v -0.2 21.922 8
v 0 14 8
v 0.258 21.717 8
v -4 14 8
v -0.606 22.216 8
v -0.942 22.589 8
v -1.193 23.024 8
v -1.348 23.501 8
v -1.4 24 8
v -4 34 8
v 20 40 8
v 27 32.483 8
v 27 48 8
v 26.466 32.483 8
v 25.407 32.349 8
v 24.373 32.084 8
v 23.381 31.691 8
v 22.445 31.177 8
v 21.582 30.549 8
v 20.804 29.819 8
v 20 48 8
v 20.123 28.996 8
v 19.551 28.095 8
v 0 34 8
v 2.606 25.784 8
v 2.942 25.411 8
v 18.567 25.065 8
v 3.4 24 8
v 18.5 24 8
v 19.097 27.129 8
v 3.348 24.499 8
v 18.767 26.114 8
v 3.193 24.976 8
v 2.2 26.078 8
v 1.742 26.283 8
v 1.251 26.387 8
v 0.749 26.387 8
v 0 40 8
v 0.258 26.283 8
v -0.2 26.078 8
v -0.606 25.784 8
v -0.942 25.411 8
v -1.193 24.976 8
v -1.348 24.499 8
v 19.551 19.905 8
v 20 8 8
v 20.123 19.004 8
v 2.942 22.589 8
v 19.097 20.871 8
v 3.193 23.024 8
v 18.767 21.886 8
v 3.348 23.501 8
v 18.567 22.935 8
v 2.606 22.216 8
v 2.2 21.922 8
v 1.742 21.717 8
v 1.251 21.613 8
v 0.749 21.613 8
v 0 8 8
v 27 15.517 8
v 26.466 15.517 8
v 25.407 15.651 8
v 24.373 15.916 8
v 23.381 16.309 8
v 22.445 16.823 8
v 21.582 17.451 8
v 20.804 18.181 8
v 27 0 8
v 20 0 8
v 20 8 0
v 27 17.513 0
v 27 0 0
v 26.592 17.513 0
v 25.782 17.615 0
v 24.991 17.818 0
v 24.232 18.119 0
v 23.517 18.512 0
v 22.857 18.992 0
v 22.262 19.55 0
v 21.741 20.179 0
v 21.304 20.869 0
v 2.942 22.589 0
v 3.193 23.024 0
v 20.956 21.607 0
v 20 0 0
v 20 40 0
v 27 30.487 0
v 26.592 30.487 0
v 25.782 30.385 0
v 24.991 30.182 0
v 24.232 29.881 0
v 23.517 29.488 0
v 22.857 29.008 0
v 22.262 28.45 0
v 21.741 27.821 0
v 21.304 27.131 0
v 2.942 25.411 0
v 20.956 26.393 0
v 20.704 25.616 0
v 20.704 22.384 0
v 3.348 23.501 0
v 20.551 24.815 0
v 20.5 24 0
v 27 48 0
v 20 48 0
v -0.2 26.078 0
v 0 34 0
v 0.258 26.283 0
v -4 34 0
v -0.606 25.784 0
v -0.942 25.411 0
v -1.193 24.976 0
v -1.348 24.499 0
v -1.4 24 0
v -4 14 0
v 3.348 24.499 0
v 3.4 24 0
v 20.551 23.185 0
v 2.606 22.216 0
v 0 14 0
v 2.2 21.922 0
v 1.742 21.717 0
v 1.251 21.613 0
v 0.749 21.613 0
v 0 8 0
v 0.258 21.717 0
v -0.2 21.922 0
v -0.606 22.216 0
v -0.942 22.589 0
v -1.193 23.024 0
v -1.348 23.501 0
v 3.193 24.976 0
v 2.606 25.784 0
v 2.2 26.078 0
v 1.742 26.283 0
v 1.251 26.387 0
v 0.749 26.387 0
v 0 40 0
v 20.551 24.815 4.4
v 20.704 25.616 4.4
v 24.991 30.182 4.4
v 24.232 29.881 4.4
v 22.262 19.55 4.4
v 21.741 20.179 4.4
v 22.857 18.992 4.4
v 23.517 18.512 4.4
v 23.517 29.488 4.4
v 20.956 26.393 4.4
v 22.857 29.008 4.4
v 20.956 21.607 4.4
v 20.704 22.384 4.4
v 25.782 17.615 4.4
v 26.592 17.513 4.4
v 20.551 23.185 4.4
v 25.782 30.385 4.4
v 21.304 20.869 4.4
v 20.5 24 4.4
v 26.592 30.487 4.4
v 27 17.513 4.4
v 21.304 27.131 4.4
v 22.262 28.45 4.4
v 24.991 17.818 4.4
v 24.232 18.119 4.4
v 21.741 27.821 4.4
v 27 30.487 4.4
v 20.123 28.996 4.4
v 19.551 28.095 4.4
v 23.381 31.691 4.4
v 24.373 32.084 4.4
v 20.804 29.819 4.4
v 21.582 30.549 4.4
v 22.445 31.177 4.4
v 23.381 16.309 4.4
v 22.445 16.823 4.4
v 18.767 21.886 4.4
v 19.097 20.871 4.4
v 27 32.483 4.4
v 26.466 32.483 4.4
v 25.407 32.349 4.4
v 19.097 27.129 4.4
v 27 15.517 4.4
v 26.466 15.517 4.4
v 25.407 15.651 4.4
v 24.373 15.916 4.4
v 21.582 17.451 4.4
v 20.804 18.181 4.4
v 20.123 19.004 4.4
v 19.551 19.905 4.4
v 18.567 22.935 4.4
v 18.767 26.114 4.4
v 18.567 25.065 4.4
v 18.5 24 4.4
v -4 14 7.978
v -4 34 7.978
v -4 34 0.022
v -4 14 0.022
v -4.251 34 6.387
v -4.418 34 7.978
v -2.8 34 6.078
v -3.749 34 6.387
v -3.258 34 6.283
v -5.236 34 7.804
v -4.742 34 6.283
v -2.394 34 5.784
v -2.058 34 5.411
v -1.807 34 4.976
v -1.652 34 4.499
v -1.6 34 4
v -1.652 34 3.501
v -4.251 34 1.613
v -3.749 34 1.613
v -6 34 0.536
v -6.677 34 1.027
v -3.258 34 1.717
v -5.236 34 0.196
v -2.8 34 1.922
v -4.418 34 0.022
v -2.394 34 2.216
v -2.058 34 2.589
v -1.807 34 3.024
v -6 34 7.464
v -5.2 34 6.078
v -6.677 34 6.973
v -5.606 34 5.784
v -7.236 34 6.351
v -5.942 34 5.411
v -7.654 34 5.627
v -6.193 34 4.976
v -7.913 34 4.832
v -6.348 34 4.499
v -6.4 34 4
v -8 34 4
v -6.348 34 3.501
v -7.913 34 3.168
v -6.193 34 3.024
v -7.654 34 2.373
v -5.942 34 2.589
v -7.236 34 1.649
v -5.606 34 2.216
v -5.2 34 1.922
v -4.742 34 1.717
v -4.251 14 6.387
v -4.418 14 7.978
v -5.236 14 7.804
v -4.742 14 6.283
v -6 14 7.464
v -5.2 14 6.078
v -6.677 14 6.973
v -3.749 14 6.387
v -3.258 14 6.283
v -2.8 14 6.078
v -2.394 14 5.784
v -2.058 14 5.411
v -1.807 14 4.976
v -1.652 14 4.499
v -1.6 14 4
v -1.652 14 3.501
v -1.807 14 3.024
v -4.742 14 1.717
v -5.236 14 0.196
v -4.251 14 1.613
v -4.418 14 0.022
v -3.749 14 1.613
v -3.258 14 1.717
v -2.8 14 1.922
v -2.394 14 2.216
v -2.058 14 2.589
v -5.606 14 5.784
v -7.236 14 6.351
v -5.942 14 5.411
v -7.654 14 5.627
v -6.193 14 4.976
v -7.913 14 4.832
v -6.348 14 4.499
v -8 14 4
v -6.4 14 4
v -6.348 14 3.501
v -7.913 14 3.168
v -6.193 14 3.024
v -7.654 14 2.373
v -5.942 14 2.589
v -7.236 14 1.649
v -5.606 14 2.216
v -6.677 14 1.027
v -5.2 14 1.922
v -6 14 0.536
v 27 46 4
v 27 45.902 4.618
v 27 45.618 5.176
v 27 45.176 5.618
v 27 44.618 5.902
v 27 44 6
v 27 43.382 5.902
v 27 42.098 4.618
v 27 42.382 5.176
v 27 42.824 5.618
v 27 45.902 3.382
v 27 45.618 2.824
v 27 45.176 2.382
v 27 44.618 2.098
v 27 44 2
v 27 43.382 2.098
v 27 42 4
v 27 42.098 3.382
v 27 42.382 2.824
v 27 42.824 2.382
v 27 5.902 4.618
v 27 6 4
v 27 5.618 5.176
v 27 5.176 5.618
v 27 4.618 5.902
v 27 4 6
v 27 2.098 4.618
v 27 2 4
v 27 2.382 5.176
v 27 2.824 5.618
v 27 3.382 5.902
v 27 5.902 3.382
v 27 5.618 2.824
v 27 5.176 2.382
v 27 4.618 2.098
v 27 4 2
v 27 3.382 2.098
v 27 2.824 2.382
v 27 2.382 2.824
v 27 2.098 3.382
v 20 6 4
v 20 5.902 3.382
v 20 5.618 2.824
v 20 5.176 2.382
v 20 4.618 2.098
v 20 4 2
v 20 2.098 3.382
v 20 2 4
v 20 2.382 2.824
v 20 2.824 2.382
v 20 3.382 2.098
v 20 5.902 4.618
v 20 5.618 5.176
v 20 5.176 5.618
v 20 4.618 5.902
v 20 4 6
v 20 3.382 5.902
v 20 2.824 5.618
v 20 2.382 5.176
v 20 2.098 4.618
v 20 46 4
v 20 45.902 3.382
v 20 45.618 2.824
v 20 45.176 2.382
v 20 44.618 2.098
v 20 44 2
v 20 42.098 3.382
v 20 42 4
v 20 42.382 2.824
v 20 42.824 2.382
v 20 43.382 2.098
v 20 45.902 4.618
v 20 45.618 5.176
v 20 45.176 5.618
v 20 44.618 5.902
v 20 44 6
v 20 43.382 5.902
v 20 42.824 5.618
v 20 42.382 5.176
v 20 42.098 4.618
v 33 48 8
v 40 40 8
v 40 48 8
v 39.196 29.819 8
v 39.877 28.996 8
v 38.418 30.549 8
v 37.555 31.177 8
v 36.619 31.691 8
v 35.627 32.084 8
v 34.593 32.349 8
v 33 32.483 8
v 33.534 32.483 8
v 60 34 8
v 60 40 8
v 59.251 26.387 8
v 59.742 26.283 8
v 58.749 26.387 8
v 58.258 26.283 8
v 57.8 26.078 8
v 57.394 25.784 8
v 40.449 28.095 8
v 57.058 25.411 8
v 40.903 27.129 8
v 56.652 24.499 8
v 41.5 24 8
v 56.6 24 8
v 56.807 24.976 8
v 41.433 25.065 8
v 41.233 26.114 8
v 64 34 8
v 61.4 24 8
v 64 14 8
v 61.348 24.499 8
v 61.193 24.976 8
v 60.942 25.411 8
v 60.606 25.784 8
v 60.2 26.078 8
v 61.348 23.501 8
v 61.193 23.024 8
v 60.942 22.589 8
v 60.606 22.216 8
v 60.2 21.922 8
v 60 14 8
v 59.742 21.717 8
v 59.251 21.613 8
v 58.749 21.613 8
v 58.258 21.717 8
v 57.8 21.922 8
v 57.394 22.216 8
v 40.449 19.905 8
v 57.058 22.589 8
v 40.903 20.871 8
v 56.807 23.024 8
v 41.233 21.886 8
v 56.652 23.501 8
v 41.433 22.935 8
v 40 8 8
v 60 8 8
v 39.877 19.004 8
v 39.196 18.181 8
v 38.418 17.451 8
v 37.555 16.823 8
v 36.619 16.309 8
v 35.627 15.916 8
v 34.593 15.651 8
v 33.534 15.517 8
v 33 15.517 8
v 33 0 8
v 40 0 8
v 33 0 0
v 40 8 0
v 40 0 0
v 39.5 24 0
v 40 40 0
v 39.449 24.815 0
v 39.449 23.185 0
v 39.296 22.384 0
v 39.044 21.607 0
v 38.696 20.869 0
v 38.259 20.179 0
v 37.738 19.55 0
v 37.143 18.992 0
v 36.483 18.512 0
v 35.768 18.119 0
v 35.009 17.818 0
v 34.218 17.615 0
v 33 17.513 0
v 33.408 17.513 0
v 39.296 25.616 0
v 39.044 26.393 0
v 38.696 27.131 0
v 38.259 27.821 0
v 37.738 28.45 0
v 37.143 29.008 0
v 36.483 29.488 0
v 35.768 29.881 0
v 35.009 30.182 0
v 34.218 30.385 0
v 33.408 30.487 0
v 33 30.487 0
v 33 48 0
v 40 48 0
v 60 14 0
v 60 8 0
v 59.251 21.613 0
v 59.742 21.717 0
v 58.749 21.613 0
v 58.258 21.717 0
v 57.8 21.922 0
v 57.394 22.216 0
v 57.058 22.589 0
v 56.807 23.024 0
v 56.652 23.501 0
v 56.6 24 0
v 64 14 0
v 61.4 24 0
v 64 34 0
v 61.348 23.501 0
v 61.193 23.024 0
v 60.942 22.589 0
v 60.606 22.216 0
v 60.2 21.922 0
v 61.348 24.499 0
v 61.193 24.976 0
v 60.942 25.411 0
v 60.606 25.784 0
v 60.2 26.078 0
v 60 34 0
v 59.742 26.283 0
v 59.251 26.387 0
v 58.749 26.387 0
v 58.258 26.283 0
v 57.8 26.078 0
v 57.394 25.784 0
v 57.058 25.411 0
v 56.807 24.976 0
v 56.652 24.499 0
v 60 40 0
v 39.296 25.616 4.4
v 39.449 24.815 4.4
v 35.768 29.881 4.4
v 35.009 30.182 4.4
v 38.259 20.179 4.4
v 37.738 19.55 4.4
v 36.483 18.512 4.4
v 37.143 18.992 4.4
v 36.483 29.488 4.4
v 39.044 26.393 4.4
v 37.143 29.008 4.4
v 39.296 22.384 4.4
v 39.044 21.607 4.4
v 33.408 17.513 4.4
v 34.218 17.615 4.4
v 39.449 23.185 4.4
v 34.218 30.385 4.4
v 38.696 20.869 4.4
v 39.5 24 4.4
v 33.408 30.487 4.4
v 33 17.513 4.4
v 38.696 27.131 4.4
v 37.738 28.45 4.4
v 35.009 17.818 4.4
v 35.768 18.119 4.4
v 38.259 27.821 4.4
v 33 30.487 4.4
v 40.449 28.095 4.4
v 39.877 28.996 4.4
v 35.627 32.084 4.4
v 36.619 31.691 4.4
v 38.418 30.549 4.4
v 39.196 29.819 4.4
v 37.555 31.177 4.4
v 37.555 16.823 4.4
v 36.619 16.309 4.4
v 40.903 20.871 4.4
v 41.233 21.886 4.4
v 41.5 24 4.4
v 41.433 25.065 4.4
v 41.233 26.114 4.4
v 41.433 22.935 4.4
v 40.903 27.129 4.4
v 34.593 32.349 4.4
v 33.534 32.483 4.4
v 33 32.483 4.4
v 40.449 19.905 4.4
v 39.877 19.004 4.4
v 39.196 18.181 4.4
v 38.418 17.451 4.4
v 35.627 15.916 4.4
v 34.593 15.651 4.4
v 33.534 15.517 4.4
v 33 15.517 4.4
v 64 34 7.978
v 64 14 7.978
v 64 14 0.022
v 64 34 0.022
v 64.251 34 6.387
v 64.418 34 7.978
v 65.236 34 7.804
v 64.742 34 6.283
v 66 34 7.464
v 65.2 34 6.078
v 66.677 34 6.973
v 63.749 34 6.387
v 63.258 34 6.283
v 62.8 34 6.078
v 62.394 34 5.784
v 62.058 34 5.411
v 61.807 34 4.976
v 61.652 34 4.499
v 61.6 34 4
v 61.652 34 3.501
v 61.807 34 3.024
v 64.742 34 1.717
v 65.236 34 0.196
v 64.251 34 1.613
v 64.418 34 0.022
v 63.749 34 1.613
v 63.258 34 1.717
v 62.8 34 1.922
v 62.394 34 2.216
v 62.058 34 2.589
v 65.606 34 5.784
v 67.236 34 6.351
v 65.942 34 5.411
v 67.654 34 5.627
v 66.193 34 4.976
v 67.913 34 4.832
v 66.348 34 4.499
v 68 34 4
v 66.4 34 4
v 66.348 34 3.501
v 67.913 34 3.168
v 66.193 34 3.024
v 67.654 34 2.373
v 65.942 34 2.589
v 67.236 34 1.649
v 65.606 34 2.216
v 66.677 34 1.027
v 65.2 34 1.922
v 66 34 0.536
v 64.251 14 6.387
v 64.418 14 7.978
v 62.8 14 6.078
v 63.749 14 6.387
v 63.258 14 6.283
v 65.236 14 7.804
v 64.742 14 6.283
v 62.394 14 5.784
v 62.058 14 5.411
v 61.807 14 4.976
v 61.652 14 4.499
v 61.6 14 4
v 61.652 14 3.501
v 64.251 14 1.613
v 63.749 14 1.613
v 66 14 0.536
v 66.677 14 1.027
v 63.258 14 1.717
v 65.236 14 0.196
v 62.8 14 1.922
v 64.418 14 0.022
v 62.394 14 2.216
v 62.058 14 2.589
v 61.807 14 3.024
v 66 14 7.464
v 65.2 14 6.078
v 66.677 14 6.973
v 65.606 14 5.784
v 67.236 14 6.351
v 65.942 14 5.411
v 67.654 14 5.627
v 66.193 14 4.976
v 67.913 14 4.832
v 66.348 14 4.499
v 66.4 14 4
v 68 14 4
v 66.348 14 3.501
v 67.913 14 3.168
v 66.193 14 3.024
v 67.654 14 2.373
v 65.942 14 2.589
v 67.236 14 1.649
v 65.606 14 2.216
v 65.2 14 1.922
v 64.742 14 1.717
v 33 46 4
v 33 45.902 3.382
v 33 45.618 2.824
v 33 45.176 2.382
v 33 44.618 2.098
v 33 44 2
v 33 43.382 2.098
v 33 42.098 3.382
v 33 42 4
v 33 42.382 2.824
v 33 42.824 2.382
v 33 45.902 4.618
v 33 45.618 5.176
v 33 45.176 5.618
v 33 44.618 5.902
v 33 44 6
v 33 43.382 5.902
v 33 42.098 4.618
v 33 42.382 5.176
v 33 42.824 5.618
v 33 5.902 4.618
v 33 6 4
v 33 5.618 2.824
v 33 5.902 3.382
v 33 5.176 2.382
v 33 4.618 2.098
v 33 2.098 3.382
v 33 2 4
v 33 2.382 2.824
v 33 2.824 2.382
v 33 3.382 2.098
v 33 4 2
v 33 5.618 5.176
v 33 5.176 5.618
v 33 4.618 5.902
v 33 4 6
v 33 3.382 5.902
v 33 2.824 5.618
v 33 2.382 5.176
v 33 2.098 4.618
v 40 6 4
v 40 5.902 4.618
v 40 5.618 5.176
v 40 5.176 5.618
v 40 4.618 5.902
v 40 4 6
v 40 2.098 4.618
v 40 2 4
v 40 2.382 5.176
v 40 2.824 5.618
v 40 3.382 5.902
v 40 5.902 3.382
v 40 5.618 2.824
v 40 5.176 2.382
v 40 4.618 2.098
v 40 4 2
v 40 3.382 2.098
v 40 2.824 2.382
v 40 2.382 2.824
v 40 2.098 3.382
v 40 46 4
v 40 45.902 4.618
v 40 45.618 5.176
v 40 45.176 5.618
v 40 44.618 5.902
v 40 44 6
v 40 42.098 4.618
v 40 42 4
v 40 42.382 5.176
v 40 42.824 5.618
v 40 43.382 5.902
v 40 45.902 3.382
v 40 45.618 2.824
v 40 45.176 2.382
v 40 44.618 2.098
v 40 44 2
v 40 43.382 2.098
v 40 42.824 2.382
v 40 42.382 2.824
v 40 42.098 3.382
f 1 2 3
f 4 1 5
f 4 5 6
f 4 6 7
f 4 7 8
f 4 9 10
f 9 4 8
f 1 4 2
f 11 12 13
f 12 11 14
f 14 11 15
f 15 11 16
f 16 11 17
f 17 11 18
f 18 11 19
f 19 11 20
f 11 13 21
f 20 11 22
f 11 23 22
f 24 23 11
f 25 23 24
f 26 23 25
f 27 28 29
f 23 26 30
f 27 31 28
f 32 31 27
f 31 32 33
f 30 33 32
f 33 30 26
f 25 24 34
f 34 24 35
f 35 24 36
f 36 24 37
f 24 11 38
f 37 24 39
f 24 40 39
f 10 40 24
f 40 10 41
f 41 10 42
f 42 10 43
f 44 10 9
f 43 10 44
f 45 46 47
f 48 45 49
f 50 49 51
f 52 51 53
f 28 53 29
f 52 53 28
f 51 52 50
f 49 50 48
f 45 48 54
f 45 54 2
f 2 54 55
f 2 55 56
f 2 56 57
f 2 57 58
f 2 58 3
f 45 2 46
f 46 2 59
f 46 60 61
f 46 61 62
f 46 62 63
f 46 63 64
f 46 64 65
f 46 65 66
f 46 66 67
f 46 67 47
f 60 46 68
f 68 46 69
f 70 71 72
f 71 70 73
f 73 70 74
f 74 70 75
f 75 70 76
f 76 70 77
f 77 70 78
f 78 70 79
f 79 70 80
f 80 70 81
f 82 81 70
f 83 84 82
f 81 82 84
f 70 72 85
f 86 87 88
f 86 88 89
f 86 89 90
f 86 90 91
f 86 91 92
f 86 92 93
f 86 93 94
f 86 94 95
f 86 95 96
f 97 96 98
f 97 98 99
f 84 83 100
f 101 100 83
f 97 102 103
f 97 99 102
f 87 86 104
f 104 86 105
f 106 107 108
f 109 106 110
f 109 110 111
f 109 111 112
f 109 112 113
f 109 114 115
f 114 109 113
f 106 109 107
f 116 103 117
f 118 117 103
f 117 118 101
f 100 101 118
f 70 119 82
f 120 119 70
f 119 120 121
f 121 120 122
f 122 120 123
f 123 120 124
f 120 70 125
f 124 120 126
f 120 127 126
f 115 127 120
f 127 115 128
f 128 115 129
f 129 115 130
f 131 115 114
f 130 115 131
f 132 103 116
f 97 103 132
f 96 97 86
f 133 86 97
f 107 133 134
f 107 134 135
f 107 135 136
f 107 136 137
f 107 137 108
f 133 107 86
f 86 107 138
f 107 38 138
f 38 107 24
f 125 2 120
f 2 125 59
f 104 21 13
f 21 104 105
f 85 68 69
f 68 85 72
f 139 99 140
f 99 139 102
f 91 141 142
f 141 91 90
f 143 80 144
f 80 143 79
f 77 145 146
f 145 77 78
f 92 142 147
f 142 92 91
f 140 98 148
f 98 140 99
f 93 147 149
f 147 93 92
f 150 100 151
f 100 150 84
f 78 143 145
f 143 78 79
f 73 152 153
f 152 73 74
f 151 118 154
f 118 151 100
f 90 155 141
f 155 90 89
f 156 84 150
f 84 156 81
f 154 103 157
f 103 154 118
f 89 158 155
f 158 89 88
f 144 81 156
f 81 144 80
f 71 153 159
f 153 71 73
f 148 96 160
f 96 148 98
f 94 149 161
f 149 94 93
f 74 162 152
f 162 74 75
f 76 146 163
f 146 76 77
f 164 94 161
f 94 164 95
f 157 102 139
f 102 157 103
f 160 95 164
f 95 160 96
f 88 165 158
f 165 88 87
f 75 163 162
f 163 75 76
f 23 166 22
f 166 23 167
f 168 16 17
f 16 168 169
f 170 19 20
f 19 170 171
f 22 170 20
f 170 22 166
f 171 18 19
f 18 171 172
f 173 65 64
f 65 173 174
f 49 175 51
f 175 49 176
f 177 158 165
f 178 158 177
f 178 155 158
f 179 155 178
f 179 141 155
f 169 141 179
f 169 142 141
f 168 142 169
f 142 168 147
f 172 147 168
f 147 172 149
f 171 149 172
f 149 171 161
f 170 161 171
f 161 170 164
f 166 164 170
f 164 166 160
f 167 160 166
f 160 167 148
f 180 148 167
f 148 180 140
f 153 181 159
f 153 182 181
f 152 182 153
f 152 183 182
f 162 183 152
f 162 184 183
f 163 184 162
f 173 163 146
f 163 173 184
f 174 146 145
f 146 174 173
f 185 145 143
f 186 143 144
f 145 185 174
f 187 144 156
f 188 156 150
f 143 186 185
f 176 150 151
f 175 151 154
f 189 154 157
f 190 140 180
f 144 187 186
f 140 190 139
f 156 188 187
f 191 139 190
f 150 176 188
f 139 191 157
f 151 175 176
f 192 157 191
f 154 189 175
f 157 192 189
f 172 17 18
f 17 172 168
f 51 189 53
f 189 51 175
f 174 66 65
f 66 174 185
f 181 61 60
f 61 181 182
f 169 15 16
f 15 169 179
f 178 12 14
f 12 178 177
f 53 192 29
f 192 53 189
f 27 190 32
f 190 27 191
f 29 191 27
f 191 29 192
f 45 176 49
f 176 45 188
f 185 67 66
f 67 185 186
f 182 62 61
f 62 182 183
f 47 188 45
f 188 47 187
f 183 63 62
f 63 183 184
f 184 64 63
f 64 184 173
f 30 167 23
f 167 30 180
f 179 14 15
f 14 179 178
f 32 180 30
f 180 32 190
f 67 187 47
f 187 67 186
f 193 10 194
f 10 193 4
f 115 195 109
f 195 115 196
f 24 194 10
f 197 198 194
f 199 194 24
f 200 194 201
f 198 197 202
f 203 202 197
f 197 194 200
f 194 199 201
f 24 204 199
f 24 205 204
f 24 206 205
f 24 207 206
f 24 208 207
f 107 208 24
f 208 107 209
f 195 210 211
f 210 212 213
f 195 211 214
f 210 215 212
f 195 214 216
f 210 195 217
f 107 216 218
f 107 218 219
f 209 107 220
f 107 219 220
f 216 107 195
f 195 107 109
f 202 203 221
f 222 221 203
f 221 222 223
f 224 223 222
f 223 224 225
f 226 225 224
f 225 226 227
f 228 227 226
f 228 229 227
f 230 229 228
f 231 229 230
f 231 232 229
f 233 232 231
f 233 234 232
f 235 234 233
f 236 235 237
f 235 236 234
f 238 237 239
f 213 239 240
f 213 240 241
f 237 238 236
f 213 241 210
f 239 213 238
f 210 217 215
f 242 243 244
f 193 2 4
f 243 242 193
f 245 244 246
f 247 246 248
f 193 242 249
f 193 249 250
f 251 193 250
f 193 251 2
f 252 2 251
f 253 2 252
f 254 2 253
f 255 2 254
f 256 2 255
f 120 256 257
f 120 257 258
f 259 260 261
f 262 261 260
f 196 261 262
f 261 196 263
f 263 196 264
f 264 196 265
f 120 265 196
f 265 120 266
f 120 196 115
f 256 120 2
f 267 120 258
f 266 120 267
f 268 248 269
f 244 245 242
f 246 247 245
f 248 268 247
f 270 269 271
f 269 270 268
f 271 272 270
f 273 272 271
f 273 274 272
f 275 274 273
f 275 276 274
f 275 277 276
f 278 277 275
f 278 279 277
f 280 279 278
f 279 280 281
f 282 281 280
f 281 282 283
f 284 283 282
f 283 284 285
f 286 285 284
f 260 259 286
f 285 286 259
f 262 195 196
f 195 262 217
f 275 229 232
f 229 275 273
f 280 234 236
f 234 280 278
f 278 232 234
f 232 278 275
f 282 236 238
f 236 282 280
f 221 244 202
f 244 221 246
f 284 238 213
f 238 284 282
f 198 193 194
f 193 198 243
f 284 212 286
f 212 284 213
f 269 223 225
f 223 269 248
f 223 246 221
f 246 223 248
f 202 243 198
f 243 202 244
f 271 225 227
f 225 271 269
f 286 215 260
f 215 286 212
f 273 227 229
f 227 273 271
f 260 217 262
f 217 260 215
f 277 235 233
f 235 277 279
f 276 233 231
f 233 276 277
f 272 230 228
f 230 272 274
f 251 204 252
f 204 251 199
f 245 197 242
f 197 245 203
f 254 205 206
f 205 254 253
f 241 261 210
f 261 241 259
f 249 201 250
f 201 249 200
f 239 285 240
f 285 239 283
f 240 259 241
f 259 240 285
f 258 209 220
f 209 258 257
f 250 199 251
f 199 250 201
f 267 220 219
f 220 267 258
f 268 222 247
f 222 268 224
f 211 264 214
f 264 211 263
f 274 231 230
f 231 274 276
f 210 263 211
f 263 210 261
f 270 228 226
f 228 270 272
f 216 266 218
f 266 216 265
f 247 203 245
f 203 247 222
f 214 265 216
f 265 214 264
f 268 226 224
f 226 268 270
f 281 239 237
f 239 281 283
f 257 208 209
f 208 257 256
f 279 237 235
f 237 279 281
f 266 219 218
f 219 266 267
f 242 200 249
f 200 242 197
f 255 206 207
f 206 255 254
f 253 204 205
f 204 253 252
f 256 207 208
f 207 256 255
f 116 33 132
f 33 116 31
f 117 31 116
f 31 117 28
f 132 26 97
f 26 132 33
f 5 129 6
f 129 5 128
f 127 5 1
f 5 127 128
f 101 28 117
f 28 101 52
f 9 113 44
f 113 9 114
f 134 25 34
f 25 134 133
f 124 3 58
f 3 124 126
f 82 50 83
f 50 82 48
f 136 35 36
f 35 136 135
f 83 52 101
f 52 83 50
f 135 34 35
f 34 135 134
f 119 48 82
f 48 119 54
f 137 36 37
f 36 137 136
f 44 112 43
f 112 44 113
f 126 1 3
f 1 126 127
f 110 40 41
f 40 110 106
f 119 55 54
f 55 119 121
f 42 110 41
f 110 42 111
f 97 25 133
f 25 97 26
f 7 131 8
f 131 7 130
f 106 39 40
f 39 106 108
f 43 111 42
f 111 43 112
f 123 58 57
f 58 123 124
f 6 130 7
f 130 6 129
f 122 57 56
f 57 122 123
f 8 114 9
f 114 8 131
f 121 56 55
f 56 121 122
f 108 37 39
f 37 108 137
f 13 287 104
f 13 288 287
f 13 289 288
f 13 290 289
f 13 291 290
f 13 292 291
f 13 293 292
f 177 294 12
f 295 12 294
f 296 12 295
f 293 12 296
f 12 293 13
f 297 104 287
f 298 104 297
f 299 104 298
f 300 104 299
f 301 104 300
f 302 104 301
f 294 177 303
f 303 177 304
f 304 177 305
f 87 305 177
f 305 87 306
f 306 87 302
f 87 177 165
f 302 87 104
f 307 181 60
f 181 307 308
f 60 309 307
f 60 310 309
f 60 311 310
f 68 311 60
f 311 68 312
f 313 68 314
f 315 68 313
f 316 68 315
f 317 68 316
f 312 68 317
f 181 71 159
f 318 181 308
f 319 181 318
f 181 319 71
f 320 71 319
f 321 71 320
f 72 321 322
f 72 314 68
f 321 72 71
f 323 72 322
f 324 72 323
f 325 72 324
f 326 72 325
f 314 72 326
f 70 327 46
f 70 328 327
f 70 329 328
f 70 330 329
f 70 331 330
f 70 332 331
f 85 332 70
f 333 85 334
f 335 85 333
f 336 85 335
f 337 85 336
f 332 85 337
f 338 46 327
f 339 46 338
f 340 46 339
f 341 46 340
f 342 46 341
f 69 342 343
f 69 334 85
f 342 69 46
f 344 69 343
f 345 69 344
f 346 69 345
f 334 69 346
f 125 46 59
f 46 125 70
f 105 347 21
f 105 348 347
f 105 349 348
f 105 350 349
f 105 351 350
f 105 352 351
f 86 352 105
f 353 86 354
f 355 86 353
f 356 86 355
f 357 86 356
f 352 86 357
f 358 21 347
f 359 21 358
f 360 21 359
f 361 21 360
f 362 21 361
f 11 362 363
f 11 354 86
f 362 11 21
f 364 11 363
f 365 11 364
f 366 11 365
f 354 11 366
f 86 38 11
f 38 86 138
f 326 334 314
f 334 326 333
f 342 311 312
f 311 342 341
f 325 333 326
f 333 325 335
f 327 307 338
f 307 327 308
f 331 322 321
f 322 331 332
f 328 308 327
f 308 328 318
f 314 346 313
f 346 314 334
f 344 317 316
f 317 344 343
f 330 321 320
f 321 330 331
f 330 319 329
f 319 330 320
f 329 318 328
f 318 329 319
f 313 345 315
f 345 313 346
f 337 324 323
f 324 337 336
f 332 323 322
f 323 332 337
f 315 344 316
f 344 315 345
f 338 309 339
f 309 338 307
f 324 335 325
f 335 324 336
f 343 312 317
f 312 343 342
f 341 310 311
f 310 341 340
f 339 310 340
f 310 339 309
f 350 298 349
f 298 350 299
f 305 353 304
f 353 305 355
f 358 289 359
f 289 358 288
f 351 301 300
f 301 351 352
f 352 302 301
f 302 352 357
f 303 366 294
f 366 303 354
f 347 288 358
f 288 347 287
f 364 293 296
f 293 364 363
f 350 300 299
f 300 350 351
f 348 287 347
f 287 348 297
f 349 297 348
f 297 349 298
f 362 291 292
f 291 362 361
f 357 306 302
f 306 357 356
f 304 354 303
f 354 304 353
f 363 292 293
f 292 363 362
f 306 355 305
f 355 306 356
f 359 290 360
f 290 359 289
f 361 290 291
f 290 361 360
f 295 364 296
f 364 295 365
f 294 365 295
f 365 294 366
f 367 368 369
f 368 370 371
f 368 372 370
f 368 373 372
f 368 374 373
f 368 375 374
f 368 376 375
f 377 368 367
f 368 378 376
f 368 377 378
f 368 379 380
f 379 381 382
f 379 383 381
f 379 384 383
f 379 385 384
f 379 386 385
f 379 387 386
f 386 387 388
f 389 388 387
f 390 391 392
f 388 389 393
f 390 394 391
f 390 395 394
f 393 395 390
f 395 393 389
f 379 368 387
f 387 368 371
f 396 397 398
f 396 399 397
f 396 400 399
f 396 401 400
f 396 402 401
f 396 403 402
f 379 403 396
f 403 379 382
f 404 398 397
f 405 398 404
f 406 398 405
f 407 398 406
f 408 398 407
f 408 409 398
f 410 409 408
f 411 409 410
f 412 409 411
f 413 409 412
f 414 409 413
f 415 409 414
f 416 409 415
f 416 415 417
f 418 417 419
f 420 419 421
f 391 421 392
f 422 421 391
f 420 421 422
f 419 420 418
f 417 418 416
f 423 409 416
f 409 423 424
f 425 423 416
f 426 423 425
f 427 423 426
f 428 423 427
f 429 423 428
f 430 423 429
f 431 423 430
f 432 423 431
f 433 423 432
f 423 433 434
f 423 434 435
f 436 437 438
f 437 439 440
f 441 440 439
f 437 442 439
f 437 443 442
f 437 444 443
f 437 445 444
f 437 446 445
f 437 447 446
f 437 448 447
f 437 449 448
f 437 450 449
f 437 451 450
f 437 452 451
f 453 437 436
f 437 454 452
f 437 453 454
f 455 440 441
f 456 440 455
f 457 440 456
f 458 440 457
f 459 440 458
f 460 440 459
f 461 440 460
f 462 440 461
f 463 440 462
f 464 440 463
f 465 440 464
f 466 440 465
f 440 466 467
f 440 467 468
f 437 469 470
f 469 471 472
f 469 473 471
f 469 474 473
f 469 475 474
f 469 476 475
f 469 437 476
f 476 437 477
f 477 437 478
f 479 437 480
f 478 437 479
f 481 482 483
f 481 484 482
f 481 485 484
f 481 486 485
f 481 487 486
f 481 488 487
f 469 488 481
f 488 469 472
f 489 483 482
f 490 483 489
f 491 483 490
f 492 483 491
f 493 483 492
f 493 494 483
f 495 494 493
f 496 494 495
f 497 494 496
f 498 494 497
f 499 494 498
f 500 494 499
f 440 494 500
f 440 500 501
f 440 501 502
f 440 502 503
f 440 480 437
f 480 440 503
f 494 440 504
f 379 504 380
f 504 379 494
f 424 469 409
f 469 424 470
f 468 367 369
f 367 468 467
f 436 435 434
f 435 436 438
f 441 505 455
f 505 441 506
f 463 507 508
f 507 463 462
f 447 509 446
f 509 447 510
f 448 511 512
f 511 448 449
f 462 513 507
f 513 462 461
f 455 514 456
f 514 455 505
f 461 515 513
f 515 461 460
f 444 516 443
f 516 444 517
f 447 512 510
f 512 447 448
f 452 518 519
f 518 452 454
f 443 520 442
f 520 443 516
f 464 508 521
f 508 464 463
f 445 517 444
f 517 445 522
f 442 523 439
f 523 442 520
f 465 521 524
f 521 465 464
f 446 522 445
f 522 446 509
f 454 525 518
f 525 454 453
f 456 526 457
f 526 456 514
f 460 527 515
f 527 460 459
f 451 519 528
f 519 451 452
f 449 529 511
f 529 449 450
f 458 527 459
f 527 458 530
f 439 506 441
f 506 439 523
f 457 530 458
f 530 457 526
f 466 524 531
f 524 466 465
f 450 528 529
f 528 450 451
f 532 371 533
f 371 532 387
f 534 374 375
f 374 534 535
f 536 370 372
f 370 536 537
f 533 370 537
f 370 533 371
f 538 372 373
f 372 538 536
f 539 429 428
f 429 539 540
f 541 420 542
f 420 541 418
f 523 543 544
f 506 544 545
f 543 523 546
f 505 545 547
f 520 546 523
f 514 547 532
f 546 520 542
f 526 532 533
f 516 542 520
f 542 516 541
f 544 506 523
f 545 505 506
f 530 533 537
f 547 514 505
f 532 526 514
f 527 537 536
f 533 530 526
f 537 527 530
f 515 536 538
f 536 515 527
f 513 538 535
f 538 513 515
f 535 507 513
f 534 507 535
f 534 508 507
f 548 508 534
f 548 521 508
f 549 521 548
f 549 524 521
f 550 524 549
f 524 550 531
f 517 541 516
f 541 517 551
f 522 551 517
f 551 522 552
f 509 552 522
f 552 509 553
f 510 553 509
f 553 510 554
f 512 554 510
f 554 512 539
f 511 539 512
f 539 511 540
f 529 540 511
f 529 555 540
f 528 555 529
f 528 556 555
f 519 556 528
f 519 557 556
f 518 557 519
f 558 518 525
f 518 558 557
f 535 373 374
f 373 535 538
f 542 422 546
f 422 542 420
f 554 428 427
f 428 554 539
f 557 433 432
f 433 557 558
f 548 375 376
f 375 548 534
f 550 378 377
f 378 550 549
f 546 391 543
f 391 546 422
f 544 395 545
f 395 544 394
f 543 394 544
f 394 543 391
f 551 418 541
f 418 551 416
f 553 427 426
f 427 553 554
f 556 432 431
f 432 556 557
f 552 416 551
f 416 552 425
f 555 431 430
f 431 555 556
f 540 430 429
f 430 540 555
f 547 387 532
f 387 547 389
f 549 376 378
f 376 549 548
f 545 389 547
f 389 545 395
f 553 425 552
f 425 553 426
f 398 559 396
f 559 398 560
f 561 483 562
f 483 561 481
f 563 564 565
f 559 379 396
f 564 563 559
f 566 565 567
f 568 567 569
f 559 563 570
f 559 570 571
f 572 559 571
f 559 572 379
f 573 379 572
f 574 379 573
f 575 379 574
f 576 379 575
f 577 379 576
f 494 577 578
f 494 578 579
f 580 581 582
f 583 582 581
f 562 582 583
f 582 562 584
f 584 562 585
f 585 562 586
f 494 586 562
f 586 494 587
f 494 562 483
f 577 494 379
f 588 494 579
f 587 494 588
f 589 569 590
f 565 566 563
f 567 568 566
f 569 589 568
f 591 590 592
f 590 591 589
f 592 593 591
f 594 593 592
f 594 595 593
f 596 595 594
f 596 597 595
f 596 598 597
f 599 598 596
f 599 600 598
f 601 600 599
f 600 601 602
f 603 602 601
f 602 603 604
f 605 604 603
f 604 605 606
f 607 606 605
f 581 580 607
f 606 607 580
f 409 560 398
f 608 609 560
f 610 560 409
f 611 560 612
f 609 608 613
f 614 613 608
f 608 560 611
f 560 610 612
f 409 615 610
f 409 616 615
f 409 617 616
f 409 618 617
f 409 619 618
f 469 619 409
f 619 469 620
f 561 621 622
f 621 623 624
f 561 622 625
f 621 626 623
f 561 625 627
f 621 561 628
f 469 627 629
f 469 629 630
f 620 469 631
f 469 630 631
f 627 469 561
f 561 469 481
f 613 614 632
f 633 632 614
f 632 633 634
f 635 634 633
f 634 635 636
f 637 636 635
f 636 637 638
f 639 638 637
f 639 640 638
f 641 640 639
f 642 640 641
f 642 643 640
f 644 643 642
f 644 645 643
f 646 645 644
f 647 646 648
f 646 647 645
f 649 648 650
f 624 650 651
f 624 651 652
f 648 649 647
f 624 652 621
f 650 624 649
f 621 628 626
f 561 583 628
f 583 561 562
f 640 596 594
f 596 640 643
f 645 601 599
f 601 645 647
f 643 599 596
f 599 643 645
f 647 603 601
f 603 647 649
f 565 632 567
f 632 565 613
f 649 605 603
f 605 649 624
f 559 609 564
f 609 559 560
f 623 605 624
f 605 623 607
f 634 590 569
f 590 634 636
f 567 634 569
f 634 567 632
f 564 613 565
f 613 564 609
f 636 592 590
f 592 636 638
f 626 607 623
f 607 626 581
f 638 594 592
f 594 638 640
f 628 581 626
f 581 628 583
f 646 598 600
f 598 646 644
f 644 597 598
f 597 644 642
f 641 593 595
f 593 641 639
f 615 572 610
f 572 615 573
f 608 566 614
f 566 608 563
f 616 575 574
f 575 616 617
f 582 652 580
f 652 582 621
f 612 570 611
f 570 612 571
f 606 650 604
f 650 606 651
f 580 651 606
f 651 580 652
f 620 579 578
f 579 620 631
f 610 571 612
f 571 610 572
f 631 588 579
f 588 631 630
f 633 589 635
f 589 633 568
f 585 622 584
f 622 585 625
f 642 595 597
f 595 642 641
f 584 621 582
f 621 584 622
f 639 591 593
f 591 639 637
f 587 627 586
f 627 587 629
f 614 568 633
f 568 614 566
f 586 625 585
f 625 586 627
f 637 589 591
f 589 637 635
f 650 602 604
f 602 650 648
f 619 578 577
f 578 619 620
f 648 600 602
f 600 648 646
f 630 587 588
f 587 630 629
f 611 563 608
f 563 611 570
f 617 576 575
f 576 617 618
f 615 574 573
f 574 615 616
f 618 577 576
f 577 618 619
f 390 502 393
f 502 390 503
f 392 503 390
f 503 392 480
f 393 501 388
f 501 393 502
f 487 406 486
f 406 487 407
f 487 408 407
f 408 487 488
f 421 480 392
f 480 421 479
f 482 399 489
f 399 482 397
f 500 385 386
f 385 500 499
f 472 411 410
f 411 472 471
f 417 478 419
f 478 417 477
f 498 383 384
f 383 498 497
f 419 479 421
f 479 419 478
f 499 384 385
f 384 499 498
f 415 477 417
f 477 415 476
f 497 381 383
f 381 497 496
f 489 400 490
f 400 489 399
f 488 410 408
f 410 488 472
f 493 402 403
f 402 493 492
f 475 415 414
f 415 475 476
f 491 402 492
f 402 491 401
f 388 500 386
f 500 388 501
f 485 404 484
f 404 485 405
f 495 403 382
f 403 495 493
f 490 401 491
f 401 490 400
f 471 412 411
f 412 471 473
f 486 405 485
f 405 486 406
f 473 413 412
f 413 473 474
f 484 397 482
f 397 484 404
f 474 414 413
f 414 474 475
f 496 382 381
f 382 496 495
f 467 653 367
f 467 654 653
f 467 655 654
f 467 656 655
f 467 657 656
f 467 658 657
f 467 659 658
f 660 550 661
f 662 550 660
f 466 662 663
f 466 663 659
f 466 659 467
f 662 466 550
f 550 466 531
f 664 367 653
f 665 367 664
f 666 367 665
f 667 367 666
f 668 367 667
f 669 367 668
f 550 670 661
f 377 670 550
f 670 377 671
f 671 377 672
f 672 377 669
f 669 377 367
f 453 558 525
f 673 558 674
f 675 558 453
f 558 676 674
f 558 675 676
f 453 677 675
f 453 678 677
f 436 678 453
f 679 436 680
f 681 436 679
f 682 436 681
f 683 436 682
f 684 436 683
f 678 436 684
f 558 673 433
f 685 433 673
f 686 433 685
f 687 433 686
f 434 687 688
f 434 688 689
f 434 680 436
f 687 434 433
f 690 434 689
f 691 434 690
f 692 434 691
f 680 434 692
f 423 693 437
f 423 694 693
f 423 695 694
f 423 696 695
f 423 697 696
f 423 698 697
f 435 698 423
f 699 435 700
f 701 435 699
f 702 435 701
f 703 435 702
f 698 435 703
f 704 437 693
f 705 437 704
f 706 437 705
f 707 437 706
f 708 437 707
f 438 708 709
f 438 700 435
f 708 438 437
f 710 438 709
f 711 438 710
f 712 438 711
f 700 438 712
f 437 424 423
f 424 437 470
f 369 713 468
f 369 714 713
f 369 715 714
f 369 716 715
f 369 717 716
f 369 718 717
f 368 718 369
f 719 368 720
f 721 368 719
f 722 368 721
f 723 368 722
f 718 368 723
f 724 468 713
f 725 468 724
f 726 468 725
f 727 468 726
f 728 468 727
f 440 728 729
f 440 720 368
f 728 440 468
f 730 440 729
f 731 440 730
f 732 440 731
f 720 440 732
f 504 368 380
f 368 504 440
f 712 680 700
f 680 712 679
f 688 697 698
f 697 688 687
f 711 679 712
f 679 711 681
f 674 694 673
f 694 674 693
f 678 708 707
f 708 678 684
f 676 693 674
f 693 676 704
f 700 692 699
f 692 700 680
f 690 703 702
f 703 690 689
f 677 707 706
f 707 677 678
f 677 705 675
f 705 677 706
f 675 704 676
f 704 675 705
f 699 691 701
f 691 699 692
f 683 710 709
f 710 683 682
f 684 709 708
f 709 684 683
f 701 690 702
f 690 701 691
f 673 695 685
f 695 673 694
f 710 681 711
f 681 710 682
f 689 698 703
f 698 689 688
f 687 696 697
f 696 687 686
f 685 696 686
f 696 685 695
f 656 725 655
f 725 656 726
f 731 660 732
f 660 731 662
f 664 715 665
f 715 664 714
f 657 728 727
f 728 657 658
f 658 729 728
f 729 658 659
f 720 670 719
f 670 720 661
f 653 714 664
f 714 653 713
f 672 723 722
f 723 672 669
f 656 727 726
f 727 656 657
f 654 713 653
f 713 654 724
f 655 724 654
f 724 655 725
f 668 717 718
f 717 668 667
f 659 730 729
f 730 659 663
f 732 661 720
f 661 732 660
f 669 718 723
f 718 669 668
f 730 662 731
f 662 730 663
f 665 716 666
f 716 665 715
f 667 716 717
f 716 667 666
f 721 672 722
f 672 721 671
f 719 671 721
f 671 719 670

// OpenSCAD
screwd=4.8;
screwd2=4;
hexd1=13;
hexd2=17;

hexagon_half();
translate([60,0]) mirror([1,0]) hexagon_half();

module hexagon_half() {
difference(){
intersection(){
  hexagon_full();
  translate([-8,0]) cube([35,48,8]);
}
  translate([-0.01,-0.01,-0.01]) cube([20.01,8.01,8.02]);
  translate([-0.01,40,-0.01]) cube([20.01,8.01,8.02]);
  translate([19.99,4,4]) rotate([0,90,0]) cylinder(d=screwd2,h=10,$fn=20);
  translate([19.99,44,4]) rotate([0,90,0]) cylinder(d=screwd2,h=10,$fn=20);
}
}
module hexagon_full(){
difference(){
  union(){
difference(){
  cube([54,48,8]);
  translate([27,24,-0.01]) cylinder(d=hexd1,h=8.02,$fn=50);
  translate([27,24,4.4]) cylinder(d=hexd2,h=4,$fn=50);
}
mirror([1,0,0])
translate([0,14]) difference(){
  translate([0,0]) {
    cube([4,20,8]);
    translate([4,0,4]) rotate([-90,0,0]) cylinder(d=8,h=20,$fn=30);
  }
  translate([4,-0.01,4]) rotate([-90,0,0]) cylinder(d=screwd,h=20.02,$fn=30);
}
translate([54,0,0])
translate([0,14]) difference(){
  translate([0,0]) {
    cube([4,20,8]);
    translate([4,0,4]) rotate([-90,0,0]) cylinder(d=8,h=20,$fn=30);
  }
  translate([4,-0.01,4]) rotate([-90,0,0]) cylinder(d=screwd,h=20.02,$fn=30);
}
}
  translate([1,24,-0.01]) cylinder(d=screwd,h=8.02,$fn=30);
translate([52,24,-0.01]) cylinder(d=screwd,h=8.02,$fn=30);
}
}
